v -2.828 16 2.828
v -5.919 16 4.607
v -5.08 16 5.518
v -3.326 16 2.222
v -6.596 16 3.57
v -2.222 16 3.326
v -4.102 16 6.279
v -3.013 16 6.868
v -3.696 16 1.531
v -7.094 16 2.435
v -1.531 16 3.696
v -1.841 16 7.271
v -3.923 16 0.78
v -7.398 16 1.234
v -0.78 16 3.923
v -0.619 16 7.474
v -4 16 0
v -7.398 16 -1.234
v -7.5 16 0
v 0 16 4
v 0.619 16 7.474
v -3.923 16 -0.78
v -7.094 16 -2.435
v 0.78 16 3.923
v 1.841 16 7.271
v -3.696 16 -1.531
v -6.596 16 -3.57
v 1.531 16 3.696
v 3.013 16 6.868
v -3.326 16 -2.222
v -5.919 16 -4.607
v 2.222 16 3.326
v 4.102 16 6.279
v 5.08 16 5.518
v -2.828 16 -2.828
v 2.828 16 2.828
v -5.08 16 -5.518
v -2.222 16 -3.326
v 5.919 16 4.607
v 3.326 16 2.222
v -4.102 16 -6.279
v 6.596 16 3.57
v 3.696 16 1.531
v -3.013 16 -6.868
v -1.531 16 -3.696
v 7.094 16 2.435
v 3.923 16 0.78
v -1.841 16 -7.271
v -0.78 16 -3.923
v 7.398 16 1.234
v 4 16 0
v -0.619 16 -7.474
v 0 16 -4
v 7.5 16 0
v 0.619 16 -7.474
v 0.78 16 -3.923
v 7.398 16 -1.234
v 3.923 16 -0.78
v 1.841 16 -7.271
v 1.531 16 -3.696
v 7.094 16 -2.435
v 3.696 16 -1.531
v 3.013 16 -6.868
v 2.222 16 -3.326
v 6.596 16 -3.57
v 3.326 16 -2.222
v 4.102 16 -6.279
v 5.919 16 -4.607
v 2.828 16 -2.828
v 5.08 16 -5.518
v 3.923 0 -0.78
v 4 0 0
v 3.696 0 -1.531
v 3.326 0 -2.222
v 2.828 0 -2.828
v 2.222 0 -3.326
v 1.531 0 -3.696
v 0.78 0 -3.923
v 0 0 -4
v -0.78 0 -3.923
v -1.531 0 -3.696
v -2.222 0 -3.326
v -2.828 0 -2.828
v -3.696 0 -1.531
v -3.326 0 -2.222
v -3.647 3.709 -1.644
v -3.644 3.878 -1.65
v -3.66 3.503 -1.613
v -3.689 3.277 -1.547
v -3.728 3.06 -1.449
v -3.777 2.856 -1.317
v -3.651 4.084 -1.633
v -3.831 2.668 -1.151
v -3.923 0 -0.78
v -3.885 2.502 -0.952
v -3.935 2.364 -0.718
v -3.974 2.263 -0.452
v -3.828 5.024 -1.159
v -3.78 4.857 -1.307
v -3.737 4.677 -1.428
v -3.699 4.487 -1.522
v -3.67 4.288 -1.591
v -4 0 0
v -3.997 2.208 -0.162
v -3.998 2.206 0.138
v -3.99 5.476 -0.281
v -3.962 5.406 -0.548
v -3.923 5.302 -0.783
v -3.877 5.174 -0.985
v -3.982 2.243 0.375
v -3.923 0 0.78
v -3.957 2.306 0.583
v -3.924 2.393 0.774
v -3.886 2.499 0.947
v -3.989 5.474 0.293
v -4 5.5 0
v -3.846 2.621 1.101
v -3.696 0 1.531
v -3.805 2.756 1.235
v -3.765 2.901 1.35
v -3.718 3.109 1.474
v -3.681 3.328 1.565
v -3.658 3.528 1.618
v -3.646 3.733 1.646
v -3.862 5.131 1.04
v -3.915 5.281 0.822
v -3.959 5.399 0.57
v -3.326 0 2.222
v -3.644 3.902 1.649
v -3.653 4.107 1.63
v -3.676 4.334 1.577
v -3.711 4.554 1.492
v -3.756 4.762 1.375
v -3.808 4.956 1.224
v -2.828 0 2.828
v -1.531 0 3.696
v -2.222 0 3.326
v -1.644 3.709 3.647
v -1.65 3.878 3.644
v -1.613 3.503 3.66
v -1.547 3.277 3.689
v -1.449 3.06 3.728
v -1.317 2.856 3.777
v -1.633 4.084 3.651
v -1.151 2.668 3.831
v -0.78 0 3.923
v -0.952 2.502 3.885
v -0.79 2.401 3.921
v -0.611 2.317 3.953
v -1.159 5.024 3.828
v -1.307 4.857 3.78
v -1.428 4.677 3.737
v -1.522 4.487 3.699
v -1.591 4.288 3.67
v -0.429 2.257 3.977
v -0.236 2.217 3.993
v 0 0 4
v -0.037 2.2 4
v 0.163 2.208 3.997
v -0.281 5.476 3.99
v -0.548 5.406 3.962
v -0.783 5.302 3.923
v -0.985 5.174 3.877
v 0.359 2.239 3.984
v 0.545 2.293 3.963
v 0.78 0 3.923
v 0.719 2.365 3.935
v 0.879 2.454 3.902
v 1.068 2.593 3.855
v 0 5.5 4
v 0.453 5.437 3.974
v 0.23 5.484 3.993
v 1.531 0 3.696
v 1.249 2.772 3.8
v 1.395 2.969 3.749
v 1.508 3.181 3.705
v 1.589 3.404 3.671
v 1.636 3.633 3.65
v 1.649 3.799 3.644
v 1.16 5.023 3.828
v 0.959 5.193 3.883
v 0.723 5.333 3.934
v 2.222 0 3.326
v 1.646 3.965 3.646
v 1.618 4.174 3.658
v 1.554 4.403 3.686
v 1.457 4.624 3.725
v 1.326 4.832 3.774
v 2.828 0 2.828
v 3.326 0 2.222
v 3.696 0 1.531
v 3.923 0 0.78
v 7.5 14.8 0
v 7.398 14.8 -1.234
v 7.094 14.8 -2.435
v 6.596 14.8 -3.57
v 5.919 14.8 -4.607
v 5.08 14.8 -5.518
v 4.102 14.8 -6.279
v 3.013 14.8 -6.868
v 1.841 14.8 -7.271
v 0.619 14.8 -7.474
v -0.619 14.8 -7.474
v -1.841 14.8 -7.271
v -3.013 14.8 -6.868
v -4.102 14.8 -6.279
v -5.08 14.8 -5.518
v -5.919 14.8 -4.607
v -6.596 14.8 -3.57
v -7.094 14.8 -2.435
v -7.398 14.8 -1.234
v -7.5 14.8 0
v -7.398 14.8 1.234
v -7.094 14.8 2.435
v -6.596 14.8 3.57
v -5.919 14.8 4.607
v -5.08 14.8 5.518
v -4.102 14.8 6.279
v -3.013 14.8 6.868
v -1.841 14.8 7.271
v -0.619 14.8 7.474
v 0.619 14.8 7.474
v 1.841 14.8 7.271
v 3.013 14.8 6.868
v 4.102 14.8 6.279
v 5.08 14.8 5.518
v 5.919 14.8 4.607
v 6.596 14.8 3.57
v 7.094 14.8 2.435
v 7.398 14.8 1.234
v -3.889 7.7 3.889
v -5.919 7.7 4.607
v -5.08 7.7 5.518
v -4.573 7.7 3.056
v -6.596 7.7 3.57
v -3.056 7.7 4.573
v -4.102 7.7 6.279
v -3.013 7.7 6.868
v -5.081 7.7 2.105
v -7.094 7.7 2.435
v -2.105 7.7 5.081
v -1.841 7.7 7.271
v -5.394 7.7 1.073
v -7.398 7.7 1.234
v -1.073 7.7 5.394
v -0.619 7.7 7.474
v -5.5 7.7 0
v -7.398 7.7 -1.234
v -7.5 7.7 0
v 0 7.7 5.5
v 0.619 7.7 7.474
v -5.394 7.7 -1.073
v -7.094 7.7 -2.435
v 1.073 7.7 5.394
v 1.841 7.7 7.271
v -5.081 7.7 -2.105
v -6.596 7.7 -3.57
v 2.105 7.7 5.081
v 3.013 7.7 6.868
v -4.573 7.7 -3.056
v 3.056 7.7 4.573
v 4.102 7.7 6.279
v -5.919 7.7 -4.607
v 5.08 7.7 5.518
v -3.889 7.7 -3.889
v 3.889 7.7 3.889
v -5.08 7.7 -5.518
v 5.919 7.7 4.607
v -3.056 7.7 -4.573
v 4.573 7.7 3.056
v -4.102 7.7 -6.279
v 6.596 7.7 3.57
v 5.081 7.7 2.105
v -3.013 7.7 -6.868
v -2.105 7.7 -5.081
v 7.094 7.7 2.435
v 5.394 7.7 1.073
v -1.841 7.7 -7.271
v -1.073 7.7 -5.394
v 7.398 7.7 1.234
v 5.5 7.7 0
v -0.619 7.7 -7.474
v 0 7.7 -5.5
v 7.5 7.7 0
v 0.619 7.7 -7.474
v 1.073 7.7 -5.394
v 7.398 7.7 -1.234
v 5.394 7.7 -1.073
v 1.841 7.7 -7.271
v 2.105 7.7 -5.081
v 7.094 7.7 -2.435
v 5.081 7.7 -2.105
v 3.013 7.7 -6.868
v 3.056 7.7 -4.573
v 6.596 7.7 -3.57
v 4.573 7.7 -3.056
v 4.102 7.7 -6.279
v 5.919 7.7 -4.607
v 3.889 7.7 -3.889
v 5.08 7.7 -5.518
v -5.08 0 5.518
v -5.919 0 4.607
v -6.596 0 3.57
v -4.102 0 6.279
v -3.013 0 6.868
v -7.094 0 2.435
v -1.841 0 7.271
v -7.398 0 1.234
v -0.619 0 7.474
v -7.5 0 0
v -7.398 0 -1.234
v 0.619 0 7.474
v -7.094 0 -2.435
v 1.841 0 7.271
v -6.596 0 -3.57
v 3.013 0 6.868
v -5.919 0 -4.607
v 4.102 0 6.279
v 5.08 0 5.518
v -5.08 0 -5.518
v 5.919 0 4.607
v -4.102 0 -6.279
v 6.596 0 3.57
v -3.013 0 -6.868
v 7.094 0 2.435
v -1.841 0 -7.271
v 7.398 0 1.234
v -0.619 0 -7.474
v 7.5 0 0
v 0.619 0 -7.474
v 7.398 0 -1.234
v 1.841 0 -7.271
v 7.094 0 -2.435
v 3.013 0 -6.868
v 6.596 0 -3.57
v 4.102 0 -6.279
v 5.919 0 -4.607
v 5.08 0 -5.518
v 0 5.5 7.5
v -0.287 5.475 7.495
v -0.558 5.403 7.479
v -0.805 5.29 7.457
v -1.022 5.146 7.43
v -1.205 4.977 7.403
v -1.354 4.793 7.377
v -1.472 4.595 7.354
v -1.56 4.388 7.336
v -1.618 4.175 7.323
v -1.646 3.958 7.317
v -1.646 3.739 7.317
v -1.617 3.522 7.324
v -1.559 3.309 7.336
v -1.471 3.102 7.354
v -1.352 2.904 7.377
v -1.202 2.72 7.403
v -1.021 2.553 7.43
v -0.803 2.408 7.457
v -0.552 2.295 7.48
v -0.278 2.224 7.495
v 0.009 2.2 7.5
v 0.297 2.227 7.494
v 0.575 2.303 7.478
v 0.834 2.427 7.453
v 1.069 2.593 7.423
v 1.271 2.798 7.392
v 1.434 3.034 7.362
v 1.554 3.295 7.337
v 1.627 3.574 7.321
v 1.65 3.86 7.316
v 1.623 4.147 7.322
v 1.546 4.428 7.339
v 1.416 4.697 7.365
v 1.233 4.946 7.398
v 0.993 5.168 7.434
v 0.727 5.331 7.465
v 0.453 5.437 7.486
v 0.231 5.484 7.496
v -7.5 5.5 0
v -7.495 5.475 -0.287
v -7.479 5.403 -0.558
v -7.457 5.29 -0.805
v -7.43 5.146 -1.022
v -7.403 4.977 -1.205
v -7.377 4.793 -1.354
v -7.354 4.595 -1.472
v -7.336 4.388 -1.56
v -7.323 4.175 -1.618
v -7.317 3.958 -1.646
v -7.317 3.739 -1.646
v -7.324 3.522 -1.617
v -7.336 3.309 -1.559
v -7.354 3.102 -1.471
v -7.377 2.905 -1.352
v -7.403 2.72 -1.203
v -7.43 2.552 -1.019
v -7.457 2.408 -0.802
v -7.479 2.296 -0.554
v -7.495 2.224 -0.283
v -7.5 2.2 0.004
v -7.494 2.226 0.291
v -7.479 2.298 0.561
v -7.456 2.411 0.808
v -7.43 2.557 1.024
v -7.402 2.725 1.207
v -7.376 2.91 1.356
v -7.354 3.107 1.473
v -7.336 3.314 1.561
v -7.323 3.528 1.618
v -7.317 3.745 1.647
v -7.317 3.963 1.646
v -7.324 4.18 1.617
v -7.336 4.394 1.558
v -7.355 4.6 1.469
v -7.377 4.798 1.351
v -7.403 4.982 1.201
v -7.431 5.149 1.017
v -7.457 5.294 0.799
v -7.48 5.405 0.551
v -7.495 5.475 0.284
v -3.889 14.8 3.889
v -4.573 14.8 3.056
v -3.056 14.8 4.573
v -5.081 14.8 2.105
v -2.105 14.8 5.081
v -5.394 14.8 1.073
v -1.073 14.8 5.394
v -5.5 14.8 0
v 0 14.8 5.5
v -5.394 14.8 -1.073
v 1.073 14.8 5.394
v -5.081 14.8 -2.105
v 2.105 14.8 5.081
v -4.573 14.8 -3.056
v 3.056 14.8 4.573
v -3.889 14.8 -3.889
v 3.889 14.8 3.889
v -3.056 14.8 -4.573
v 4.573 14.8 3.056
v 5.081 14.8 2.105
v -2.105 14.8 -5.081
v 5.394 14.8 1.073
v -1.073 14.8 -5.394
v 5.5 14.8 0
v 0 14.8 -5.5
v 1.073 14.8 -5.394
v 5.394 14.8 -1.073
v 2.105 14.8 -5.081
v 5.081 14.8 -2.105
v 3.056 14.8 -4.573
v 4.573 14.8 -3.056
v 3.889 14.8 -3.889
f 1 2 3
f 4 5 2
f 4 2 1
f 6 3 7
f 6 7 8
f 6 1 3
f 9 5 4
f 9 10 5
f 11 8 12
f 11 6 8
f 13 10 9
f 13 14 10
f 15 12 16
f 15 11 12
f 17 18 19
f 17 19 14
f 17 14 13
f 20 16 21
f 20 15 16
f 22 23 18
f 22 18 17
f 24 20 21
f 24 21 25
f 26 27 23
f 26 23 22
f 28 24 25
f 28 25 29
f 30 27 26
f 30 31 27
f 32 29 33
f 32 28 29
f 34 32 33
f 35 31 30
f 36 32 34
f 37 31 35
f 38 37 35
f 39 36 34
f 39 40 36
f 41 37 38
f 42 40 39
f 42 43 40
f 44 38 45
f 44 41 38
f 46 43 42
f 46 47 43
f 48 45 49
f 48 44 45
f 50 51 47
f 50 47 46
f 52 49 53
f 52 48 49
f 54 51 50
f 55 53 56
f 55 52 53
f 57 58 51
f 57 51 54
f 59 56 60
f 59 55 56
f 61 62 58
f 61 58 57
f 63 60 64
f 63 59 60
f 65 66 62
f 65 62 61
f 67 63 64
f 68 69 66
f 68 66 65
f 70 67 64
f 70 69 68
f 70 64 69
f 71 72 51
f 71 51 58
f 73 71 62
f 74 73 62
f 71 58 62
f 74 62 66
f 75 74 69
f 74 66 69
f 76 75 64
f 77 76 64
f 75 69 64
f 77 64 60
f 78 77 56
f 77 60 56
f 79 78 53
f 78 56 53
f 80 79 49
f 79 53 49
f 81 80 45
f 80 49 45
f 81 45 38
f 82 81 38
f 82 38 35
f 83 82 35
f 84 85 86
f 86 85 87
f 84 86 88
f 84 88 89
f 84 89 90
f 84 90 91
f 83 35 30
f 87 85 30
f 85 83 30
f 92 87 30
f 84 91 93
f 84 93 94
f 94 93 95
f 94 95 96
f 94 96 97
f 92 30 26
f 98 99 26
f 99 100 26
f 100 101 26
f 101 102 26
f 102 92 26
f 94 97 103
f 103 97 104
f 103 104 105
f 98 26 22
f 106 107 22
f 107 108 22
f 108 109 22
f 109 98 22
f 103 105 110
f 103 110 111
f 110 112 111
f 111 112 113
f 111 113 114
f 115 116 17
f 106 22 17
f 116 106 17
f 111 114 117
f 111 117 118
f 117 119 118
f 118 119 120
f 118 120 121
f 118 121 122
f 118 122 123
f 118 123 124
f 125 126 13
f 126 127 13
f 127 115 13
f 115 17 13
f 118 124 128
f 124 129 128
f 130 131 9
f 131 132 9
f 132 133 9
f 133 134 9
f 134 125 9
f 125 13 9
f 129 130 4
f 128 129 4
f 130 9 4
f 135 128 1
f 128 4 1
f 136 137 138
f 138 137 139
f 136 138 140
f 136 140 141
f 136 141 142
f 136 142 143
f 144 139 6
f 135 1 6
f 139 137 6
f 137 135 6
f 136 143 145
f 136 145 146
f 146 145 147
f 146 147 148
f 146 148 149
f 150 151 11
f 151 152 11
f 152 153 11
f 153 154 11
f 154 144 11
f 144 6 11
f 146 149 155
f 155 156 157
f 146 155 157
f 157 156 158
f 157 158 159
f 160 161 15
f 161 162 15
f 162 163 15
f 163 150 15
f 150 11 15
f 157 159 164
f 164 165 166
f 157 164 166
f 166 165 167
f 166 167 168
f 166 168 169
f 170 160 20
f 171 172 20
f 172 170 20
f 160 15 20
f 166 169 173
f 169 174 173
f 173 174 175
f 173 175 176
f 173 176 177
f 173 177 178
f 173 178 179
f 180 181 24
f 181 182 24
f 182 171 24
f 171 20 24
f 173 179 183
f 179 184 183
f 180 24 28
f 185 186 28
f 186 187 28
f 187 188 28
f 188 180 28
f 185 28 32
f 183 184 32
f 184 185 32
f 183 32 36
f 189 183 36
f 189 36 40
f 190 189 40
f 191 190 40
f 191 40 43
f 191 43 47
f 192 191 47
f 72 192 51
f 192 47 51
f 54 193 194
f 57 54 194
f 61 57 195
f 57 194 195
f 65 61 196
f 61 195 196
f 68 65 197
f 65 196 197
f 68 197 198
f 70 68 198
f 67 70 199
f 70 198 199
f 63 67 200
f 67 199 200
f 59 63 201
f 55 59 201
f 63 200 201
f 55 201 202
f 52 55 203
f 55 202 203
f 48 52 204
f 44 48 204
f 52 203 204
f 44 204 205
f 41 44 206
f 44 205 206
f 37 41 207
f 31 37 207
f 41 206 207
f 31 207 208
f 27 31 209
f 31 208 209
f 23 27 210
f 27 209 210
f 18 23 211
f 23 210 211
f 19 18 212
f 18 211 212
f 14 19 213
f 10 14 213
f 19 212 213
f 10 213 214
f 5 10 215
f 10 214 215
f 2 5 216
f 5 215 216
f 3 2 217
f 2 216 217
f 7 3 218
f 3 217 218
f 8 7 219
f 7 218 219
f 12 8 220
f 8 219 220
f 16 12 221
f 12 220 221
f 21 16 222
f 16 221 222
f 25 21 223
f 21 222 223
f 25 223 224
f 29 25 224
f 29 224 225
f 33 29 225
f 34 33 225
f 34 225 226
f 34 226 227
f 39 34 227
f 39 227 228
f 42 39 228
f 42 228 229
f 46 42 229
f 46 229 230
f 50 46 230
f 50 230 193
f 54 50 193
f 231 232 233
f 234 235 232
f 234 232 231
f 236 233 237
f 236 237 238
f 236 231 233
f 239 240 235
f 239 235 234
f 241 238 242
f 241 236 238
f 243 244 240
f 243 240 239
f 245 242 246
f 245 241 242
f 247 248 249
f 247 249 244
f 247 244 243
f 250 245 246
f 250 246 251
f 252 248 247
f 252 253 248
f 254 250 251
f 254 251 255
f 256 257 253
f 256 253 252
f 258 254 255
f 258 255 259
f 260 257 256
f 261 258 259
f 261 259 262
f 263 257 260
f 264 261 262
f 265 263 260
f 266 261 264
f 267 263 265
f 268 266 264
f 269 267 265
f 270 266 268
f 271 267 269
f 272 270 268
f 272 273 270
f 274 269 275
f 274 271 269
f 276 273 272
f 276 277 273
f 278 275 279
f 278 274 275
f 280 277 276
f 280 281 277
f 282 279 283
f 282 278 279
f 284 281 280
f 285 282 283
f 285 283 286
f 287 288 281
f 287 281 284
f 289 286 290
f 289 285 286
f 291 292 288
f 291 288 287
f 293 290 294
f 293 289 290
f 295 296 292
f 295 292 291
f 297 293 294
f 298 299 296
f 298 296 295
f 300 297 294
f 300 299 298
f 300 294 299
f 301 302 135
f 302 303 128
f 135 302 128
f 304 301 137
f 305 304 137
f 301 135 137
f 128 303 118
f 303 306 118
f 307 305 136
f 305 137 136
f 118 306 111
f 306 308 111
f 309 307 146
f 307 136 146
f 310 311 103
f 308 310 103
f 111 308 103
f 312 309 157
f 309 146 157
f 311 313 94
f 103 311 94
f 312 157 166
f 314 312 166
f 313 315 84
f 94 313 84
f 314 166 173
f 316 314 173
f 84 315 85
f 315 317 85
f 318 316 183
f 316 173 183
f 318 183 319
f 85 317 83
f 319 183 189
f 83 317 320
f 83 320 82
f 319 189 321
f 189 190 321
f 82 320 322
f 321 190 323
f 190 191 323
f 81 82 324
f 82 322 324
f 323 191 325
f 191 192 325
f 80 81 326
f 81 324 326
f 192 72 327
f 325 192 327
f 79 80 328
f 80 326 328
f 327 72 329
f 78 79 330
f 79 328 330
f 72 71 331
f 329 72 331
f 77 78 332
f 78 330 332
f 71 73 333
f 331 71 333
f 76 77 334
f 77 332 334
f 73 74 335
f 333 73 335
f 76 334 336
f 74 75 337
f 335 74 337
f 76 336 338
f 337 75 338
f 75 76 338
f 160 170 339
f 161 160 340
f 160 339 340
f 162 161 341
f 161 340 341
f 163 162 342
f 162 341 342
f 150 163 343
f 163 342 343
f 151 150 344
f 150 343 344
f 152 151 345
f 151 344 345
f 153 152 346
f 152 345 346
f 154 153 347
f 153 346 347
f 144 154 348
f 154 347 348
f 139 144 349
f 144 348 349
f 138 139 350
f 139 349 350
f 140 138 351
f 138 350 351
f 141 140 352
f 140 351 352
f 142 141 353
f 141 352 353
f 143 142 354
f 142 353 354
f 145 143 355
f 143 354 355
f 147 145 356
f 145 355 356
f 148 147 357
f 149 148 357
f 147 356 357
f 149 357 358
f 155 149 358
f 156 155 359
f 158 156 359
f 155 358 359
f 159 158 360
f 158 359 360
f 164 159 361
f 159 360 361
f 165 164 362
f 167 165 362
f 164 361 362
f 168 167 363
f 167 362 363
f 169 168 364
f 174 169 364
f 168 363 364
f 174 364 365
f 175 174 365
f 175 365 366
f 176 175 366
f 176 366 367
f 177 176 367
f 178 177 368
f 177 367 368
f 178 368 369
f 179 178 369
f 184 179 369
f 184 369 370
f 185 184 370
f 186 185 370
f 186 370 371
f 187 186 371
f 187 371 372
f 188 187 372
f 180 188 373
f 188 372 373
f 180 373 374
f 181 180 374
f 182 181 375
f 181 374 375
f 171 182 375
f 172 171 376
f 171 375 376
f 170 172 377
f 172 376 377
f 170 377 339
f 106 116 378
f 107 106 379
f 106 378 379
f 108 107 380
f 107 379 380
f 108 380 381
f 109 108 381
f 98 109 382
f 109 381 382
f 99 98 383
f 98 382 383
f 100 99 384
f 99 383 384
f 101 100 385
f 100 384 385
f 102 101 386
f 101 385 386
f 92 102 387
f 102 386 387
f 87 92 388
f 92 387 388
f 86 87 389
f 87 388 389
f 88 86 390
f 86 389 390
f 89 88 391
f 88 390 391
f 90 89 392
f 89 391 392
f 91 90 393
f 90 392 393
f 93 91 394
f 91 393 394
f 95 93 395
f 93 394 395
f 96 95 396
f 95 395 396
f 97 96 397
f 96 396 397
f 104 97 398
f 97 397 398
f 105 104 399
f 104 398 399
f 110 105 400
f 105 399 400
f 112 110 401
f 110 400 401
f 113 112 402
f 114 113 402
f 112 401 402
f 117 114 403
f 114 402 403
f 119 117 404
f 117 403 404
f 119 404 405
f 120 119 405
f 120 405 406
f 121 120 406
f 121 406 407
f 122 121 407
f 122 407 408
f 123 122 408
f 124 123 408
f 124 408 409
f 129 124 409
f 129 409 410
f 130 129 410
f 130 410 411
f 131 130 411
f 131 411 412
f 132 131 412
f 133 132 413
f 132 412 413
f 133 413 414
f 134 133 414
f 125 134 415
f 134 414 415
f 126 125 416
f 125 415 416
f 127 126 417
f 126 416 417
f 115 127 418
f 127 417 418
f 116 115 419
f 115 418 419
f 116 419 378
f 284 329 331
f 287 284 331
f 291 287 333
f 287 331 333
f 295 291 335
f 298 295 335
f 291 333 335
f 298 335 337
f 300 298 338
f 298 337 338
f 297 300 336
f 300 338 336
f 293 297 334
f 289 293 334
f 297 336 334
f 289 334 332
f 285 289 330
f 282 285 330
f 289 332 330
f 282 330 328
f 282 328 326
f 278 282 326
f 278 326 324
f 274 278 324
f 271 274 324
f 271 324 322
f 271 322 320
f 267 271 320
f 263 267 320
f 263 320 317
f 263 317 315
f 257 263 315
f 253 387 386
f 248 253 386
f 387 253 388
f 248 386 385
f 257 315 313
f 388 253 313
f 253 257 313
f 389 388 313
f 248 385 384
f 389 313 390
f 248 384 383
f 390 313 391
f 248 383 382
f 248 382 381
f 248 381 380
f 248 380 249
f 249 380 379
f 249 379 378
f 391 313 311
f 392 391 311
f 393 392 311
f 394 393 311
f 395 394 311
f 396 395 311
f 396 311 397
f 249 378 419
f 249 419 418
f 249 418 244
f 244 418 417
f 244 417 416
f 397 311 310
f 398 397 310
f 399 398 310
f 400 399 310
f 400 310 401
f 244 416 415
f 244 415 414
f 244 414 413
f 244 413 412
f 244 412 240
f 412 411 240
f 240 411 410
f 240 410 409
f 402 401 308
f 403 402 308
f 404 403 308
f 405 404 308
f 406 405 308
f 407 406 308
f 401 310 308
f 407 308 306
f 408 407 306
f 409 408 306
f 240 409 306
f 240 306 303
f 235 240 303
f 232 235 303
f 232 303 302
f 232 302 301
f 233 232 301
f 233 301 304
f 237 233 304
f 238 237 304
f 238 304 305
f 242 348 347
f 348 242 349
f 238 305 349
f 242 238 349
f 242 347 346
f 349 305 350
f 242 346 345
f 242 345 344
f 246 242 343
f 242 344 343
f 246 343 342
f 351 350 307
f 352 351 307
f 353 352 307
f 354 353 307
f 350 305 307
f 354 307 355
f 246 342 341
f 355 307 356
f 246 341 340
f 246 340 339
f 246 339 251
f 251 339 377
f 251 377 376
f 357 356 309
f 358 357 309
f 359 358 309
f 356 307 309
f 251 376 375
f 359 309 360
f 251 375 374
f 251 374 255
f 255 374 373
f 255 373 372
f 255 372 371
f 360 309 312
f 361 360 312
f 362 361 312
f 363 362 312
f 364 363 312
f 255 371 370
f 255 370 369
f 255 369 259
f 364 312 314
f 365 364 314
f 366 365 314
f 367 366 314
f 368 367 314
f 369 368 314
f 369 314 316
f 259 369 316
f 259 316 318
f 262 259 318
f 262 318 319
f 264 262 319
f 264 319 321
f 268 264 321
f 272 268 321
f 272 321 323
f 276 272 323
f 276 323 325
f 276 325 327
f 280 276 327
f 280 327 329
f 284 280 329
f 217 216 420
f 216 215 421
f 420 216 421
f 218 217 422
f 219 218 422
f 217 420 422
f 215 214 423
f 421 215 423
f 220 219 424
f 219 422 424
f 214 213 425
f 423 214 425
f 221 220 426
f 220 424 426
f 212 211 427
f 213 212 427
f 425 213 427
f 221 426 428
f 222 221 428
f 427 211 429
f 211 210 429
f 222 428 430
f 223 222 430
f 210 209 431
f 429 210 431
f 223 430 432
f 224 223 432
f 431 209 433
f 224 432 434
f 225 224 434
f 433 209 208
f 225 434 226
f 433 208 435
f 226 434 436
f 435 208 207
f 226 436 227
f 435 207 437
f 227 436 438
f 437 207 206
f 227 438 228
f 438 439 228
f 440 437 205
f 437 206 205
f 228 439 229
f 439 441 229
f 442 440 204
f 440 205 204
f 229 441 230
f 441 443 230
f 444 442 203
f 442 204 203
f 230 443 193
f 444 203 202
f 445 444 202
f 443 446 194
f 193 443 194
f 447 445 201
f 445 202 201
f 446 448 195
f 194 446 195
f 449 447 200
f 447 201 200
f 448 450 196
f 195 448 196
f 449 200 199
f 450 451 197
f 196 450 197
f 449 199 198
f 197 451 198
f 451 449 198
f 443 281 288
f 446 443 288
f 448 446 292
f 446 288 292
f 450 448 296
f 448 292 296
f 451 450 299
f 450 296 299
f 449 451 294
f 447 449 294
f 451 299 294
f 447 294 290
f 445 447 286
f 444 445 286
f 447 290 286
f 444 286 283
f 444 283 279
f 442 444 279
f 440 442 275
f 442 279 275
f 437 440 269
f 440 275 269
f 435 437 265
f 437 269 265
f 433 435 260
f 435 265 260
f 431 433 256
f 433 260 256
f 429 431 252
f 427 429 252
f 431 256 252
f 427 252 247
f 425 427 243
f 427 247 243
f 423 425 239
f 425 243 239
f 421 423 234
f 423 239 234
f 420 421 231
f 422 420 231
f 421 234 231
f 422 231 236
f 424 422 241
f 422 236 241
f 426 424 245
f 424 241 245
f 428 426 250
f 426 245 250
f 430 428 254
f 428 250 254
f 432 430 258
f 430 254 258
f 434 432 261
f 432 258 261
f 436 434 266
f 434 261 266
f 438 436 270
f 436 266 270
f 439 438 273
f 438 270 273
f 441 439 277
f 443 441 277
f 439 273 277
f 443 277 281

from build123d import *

# Parameters (mm, degrees)
CROQUIS1_R              = 7.5
SALIENTE_EXTRUIR1_DEPTH = 7.7
CROQUIS2_R              = 5.5
SALIENTE_EXTRUIR2_DEPTH = 7.1
CROQUIS3_R              = 7.5
SALIENTE_EXTRUIR3_DEPTH = 1.2
CROQUIS4_R              = 4
CORTAR_EXTRUIR1_DEPTH   = 17
CROQUIS5_W              = 1.65
CROQUIS5_H              = 7.501
MATRIZC1_COUNT          = 2
MATRIZC1_ANGLE          = 90


with BuildPart() as part:
    # Croquis1 → Saliente-Extruir1 (new body)
    with BuildSketch(Plane(origin=(0, 0, 0), x_dir=(1, 0, 0), z_dir=(0, 1, 0))):
        Circle(CROQUIS1_R)
    extrude(amount=SALIENTE_EXTRUIR1_DEPTH)

    # Croquis2 → Saliente-Extruir2 (add)
    with BuildSketch(Plane(origin=(0, 7.7, 0), x_dir=(1, 0, 0), z_dir=(0, 1, 0))):
        Circle(CROQUIS2_R)
    extrude(amount=SALIENTE_EXTRUIR2_DEPTH)

    # Croquis3 → Saliente-Extruir3 (add)
    with BuildSketch(Plane(origin=(0, 14.8, 0), x_dir=(1, 0, 0), z_dir=(0, 1, 0))):
        Circle(CROQUIS3_R)
    extrude(amount=SALIENTE_EXTRUIR3_DEPTH)

    # Croquis4 → Cortar-Extruir1 (cut, through all)
    with BuildSketch(Plane(origin=(0, 16, 0), x_dir=(1, 0, 0), z_dir=(0, 1, 0))):
        Circle(CROQUIS4_R)
    extrude(amount=-CORTAR_EXTRUIR1_DEPTH, mode=Mode.SUBTRACT)

    # Croquis5 → Taladro roscado M31 (definir posicio) (revolve, cut)
    with BuildSketch(Plane(origin=(0, 3.85, 0), x_dir=(0, 1, 0), z_dir=(1, 0, 0))):
        with Locations((0.825, 3.7505)):
            Rectangle(CROQUIS5_W, CROQUIS5_H)
    taladro_roscado_m31_definir_posicio = revolve(axis=Axis((0, 3.85, -6.35), (0, 0, 1)), mode=Mode.SUBTRACT)

    # MatrizC1: Taladro roscado M31 (definir posicio) ×2 about axis
    matrizc1_axis = Axis((0, 7.7, 0), (0, -1, 0))
    for i in range(1, MATRIZC1_COUNT):
        add(taladro_roscado_m31_definir_posicio.rotate(matrizc1_axis, i * MATRIZC1_ANGLE / (MATRIZC1_COUNT - 1)), mode=Mode.SUBTRACT)


solid = part.part
